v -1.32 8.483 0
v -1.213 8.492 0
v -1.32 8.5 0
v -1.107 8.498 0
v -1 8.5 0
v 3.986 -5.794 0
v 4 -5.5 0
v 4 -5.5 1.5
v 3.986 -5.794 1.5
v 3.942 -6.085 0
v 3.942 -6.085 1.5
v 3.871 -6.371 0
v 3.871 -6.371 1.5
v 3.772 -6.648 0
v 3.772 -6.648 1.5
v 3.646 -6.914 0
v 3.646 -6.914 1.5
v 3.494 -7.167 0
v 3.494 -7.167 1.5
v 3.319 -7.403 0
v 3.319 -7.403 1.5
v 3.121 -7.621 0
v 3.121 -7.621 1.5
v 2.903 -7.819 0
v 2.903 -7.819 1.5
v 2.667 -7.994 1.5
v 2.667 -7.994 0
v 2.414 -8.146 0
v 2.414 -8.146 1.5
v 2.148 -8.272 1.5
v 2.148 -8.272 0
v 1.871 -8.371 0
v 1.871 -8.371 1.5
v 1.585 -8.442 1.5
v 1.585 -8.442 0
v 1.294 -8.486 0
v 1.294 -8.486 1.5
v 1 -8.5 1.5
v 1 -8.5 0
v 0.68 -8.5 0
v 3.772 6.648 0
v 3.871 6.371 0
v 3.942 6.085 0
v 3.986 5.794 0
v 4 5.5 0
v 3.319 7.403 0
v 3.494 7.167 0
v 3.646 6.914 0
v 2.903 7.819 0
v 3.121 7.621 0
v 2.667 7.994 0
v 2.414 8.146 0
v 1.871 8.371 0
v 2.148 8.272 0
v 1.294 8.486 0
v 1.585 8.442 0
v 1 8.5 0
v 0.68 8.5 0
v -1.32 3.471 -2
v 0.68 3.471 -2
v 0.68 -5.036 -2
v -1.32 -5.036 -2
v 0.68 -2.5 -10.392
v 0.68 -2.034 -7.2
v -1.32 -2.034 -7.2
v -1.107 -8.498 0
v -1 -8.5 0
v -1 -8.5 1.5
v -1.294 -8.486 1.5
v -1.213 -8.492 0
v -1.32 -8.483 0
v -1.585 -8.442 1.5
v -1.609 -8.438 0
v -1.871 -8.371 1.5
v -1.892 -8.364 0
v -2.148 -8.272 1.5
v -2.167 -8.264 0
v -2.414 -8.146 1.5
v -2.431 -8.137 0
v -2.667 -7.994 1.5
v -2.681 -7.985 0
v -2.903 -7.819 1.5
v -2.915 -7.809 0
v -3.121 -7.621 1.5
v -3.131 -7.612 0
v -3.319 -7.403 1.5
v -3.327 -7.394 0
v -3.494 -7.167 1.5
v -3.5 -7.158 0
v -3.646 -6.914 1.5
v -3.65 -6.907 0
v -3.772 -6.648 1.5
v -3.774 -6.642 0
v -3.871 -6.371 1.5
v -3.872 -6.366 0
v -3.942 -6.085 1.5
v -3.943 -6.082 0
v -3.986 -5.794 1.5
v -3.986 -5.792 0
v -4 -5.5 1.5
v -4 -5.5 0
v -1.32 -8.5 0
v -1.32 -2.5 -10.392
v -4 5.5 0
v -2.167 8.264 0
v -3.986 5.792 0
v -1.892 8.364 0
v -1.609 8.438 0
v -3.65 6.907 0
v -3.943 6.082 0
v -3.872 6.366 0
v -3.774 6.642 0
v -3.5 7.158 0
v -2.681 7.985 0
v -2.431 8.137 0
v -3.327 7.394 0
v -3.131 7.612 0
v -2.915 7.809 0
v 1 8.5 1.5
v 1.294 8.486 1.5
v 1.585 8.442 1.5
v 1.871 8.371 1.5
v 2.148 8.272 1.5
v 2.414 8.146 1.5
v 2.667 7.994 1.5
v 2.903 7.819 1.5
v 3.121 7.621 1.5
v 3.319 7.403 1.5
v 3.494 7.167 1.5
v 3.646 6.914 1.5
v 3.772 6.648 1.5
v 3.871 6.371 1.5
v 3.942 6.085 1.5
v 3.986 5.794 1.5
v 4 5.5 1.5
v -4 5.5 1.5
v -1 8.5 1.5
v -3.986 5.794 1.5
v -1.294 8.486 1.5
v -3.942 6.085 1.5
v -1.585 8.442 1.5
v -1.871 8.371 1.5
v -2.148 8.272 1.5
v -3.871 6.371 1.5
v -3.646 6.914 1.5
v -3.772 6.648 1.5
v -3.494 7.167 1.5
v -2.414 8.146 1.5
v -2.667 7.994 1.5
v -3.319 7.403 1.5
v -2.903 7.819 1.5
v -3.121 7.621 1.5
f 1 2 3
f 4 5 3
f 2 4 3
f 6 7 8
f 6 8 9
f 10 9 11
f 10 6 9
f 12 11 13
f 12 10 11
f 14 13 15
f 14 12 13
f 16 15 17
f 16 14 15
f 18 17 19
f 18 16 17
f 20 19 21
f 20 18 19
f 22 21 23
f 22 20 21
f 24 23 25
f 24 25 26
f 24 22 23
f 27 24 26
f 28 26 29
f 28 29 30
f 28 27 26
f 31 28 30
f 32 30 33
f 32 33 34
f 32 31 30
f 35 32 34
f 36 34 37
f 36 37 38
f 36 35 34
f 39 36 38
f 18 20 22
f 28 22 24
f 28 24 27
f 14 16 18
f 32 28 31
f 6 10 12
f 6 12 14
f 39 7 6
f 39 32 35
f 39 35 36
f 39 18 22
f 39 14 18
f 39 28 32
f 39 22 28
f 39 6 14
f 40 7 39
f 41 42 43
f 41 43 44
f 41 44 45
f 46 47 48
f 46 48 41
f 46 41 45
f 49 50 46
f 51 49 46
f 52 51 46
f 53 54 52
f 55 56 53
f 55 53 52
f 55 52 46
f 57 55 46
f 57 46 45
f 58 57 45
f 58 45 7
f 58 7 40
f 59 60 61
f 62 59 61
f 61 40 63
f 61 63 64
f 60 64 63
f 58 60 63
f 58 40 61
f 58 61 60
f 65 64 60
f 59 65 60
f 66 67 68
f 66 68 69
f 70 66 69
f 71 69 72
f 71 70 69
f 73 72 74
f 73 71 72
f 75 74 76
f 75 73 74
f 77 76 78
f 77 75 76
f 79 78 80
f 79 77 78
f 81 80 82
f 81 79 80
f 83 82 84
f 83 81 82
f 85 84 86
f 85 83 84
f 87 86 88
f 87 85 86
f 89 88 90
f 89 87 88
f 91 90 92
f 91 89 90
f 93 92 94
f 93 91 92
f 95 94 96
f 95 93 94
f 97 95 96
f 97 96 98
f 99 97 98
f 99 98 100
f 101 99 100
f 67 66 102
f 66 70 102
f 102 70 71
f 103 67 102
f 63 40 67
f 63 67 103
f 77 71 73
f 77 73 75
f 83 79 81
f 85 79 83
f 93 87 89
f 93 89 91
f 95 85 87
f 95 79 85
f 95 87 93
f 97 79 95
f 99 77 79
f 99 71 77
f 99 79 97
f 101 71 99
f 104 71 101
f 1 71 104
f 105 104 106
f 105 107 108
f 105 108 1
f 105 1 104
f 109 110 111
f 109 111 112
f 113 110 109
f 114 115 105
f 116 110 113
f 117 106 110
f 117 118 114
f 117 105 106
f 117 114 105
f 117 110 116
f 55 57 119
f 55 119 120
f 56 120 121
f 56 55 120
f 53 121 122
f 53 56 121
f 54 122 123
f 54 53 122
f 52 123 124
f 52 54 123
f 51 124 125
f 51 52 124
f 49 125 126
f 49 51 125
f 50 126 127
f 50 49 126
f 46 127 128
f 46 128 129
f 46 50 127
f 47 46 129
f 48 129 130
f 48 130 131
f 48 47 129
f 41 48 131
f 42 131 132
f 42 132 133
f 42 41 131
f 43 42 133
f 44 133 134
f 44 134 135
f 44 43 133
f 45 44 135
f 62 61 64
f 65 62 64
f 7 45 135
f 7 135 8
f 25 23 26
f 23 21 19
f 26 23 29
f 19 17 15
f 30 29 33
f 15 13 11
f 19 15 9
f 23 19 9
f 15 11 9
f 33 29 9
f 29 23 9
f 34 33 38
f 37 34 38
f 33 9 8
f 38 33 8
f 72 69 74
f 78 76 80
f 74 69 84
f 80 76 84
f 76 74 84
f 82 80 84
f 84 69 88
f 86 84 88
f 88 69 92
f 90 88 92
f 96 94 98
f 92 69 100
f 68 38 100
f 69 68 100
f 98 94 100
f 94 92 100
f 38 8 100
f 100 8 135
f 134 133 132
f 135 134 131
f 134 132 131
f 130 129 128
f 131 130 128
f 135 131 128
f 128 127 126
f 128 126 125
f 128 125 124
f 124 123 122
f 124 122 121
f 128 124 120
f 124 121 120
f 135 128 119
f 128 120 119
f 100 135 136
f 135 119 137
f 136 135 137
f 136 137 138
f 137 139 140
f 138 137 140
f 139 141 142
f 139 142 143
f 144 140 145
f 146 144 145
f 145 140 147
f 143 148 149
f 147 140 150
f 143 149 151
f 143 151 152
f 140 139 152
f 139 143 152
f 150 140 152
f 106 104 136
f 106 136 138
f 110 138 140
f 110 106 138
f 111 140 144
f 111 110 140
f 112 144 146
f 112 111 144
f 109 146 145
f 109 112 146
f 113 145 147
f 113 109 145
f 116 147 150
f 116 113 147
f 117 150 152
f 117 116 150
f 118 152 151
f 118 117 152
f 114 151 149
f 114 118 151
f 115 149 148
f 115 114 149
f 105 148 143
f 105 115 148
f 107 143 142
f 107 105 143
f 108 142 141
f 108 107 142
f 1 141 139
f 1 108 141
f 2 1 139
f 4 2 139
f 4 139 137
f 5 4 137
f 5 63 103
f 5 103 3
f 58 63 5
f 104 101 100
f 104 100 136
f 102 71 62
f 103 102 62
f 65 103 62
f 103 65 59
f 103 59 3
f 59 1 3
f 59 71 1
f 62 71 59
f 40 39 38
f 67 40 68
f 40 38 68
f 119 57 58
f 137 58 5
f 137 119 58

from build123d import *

# Parameters (mm, degrees)
BOSS_EXTRUDE1_DEPTH = 1.5
SKETCH3_W           = 2
SKETCH3_H           = 17
BOSS_EXTRUDE2_DEPTH = 20
CUT_EXTRUDE1_DEPTH  = 5.680224753
CUT_EXTRUDE2_DEPTH  = 5.680224753


with BuildPart() as part:
    # Sketch1 → Boss-Extrude1 (new body)
    with BuildSketch(Plane.XY):
        with BuildLine():
            Line((-1, 8.5), (1, 8.5))
            ThreePointArc((1, 8.5), (3.121320344, 7.621320344), (4, 5.5))
            Line((4, 5.5), (4, -5.5))
            ThreePointArc((4, -5.5), (3.121320344, -7.621320344), (1, -8.5))
            Line((1, -8.5), (-1, -8.5))
            ThreePointArc((-1, -8.5), (-3.121320344, -7.621320344), (-4, -5.5))
            Line((-4, -5.5), (-4, 5.5))
            ThreePointArc((-4, 5.5), (-3.121320344, 7.621320344), (-1, 8.5))
        make_face()
    extrude(amount=BOSS_EXTRUDE1_DEPTH)

    # Sketch3 → Boss-Extrude2 (add)
    with BuildSketch(Plane(origin=(0, 0, 0), x_dir=(-1, 0, 0), z_dir=(0, 0, -1))):
        with Locations((0.319775247, 0)):
            Rectangle(SKETCH3_W, SKETCH3_H)
    extrude(amount=BOSS_EXTRUDE2_DEPTH)

    # Sketch4 → Cut-Extrude1 (cut, through all)
    with BuildSketch(Plane(origin=(0.680224753, 0, 0), x_dir=(0, 0, -1), z_dir=(1, 0, 0))):
        Polygon((0, -8.5), (10.392304845, -2.5), (0, 8.5), (20, 8.5), (20, -8.5), align=None)
    extrude(amount=-CUT_EXTRUDE1_DEPTH, mode=Mode.SUBTRACT)

    # Sketch5 → Cut-Extrude2 (cut, through all)
    with BuildSketch(Plane(origin=(0.680224753, 0, 0), x_dir=(0, 0, -1), z_dir=(1, 0, 0))):
        Polygon((2, 3.470750697), (2, -5.035898385), (7.200217087, -2.03355165), align=None)
    extrude(amount=-CUT_EXTRUDE2_DEPTH, mode=Mode.SUBTRACT)


solid = part.part
